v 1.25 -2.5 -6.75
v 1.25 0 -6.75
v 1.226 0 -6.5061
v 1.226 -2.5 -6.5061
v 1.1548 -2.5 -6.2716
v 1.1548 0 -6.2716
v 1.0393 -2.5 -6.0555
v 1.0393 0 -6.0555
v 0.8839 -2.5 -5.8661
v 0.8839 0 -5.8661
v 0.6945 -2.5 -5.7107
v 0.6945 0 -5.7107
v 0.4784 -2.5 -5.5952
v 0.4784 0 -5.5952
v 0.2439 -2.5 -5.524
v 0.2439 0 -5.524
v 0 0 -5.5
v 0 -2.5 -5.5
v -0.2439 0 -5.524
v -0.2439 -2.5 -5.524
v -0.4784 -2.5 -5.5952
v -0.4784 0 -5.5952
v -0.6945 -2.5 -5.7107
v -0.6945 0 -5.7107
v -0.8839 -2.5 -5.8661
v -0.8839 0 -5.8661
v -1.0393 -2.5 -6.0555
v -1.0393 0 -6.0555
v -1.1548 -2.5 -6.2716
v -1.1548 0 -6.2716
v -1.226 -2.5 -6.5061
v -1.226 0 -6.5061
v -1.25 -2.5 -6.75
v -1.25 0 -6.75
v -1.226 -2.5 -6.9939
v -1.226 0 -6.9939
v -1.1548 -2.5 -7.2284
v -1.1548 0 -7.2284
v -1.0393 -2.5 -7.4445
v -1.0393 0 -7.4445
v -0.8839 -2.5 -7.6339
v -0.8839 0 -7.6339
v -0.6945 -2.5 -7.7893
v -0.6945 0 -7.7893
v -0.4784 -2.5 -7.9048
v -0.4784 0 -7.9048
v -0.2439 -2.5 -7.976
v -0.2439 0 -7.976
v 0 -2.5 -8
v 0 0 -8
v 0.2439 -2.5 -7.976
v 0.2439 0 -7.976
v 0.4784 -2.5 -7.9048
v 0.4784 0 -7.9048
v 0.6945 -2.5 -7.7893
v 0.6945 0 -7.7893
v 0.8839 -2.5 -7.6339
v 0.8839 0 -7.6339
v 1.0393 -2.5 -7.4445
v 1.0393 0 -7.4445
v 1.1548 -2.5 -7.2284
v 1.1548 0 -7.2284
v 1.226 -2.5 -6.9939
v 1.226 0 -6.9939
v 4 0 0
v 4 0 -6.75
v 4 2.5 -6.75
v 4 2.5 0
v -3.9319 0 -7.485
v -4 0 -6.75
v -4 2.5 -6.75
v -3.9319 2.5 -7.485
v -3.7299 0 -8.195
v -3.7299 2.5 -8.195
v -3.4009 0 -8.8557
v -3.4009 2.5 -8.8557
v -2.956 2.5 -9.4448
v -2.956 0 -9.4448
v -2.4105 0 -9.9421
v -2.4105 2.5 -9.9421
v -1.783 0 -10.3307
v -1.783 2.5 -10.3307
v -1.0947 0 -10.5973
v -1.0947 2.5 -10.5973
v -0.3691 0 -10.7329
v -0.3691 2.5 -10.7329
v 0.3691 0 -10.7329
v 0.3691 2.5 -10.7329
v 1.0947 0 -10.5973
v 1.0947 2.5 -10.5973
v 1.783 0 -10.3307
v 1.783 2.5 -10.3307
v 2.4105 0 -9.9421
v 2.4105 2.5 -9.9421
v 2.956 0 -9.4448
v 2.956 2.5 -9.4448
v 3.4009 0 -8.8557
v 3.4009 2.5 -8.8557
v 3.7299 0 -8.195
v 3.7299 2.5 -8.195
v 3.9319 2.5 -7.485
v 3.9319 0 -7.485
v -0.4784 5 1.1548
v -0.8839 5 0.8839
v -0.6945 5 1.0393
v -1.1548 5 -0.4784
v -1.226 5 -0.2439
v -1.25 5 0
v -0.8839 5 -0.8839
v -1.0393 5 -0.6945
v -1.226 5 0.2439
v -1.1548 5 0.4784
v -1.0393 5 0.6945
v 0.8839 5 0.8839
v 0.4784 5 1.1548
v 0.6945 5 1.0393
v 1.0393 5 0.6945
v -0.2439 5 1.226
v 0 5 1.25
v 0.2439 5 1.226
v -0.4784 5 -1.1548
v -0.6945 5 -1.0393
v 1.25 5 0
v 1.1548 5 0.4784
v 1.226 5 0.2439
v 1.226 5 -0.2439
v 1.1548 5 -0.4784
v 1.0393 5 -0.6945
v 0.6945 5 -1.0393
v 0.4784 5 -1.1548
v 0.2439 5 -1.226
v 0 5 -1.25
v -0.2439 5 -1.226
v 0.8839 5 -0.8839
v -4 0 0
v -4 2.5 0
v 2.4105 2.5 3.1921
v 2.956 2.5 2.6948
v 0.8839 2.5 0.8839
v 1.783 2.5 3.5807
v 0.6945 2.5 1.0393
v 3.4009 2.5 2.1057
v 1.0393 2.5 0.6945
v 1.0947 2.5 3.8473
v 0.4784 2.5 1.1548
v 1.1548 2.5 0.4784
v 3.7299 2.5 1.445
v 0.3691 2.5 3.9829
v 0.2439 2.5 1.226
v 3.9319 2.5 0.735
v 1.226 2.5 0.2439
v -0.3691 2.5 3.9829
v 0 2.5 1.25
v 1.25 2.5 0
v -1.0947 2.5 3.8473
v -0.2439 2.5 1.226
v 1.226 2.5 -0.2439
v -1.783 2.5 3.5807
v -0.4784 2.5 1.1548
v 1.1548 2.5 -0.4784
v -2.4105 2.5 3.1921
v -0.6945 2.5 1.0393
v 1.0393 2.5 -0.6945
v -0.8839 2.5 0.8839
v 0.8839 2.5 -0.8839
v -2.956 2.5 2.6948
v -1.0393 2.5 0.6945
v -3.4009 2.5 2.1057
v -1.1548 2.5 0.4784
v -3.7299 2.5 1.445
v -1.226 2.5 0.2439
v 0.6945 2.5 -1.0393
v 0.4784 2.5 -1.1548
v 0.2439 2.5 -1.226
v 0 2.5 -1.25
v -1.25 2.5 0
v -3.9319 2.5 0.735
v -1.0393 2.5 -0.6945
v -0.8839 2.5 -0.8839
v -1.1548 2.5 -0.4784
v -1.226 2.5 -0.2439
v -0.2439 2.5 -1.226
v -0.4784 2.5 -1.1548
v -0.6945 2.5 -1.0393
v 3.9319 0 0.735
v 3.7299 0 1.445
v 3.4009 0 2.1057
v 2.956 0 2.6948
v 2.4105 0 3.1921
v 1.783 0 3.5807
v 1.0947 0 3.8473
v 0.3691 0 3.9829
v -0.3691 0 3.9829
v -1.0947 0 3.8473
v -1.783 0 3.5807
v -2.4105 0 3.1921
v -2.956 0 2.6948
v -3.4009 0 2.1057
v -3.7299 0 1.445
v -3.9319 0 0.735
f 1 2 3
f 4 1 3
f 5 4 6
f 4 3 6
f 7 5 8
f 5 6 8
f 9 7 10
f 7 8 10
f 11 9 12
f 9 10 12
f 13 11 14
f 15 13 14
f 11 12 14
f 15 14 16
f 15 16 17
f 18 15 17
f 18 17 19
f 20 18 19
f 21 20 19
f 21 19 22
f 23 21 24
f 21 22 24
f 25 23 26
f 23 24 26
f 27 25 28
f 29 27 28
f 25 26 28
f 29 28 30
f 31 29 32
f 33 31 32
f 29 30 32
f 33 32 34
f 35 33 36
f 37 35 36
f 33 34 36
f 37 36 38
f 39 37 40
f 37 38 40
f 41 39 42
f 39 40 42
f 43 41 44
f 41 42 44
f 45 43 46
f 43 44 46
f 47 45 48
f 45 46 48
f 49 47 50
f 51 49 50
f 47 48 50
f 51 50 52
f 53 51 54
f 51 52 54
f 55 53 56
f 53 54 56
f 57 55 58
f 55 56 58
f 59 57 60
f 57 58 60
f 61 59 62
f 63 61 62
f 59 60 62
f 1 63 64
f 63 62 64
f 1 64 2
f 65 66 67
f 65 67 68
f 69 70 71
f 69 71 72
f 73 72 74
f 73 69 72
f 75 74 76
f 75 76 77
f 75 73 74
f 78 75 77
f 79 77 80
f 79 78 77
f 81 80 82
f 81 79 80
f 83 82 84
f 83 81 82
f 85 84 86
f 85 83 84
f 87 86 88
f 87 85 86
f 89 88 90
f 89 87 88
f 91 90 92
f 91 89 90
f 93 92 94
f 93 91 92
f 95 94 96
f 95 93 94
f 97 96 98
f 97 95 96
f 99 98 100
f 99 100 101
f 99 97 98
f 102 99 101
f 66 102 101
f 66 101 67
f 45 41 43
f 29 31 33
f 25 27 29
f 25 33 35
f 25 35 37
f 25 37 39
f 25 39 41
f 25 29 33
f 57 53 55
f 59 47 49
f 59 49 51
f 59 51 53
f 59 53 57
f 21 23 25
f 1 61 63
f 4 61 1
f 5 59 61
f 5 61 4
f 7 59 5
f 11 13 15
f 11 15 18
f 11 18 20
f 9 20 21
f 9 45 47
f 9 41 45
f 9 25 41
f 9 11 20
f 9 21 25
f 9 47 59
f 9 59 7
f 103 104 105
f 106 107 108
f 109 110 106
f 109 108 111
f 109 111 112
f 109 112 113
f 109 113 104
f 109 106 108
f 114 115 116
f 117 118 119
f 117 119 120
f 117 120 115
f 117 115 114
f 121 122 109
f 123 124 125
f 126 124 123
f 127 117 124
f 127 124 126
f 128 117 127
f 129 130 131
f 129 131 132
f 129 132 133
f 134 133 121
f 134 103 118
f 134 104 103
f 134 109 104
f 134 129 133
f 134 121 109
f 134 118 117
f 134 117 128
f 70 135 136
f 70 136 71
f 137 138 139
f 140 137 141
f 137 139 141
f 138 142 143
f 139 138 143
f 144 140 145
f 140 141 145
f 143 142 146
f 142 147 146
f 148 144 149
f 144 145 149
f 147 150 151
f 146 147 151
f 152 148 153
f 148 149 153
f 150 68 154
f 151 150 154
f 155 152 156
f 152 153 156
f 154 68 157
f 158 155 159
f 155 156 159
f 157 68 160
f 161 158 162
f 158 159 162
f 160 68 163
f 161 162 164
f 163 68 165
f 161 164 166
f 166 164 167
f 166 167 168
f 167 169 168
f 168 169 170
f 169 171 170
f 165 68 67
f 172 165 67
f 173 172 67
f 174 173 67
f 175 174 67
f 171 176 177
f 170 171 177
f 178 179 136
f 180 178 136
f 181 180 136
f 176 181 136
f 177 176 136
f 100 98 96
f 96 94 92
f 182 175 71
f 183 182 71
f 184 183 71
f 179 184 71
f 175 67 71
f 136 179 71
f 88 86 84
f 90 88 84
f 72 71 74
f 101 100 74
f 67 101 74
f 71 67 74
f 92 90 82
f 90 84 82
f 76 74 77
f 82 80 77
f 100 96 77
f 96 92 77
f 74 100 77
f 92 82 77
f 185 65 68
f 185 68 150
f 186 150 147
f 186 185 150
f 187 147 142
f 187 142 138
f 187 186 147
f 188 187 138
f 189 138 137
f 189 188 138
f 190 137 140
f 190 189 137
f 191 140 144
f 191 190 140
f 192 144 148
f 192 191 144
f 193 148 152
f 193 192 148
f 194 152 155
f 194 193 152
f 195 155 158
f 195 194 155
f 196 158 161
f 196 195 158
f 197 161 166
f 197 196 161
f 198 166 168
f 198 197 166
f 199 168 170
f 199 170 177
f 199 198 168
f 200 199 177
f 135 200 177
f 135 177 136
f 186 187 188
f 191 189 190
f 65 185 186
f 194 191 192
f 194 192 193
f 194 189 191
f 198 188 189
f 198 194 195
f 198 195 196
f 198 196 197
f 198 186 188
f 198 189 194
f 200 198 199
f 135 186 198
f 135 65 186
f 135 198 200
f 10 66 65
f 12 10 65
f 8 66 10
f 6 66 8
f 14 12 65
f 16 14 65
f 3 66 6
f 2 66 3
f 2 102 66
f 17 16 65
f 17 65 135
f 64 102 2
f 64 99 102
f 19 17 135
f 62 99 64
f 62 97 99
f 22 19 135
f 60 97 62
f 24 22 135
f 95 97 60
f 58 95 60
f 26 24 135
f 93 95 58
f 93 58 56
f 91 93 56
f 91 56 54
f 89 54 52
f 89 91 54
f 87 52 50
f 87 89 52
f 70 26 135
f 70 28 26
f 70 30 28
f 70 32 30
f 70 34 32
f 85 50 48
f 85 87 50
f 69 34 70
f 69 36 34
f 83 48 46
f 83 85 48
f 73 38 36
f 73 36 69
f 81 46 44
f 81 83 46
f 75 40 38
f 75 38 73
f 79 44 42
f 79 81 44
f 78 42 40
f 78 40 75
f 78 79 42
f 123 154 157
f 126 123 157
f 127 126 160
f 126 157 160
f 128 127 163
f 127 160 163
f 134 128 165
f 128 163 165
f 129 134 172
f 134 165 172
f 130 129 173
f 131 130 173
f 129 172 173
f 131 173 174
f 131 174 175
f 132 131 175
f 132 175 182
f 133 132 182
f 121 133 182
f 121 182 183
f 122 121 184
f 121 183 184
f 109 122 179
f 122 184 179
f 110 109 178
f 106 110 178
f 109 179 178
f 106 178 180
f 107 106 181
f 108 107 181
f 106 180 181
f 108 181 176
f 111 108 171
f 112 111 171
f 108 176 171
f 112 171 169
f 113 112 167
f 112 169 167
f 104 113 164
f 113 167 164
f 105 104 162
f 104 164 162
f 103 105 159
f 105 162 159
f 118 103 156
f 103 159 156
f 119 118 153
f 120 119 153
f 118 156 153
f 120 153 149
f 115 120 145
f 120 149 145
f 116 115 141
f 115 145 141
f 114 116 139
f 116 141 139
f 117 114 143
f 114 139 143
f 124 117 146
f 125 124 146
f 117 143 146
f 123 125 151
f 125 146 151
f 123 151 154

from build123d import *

# Parameters (mm, degrees)
BOSS_EXTRUDE1_DEPTH = 2.5
BOSS_EXTRUDE2_DEPTH = 2.5
SKETCH3_R           = 1.25
BOSS_EXTRUDE3_DEPTH = 2.5
SKETCH4_R           = 1.25
BOSS_EXTRUDE4_DEPTH = 2.5


with BuildPart() as part:
    # Sketch1 → Boss-Extrude1 (new body)
    with BuildSketch(Plane(origin=(0, 0, 0), x_dir=(1, 0, 0), z_dir=(0, 1, 0))):
        with BuildLine():
            Line((4, 6.75), (4, 0))
            ThreePointArc((4, 0), (0, -4), (-4, 0))
            Line((-4, 0), (-4, 6.75))
            ThreePointArc((-4, 6.75), (0, 10.75), (4, 6.75))
        make_face()
    extrude(amount=BOSS_EXTRUDE1_DEPTH)

    # Sketch1<3> → Boss-Extrude2 (add)
    with BuildSketch(Plane(origin=(0, 0, 0), x_dir=(1, 0, 0), z_dir=(0, 1, 0))):
        with BuildLine():
            Line((4, 6.75), (4, 0))
            ThreePointArc((4, 0), (0, -4), (-4, 0))
            Line((-4, 0), (-4, 6.75))
            ThreePointArc((-4, 6.75), (0, 10.75), (4, 6.75))
        make_face()
    extrude(amount=BOSS_EXTRUDE2_DEPTH)

    # Sketch3 → Boss-Extrude3 (add)
    with BuildSketch(Plane(origin=(0, 2.5, 0), x_dir=(1, 0, 0), z_dir=(0, 1, 0))):
        Circle(SKETCH3_R)
    extrude(amount=BOSS_EXTRUDE3_DEPTH)

    # Sketch4 → Boss-Extrude4 (add)
    with BuildSketch(Plane.XZ):
        with Locations((0, -6.75)):
            Circle(SKETCH4_R)
    extrude(amount=BOSS_EXTRUDE4_DEPTH)


solid = part.part
